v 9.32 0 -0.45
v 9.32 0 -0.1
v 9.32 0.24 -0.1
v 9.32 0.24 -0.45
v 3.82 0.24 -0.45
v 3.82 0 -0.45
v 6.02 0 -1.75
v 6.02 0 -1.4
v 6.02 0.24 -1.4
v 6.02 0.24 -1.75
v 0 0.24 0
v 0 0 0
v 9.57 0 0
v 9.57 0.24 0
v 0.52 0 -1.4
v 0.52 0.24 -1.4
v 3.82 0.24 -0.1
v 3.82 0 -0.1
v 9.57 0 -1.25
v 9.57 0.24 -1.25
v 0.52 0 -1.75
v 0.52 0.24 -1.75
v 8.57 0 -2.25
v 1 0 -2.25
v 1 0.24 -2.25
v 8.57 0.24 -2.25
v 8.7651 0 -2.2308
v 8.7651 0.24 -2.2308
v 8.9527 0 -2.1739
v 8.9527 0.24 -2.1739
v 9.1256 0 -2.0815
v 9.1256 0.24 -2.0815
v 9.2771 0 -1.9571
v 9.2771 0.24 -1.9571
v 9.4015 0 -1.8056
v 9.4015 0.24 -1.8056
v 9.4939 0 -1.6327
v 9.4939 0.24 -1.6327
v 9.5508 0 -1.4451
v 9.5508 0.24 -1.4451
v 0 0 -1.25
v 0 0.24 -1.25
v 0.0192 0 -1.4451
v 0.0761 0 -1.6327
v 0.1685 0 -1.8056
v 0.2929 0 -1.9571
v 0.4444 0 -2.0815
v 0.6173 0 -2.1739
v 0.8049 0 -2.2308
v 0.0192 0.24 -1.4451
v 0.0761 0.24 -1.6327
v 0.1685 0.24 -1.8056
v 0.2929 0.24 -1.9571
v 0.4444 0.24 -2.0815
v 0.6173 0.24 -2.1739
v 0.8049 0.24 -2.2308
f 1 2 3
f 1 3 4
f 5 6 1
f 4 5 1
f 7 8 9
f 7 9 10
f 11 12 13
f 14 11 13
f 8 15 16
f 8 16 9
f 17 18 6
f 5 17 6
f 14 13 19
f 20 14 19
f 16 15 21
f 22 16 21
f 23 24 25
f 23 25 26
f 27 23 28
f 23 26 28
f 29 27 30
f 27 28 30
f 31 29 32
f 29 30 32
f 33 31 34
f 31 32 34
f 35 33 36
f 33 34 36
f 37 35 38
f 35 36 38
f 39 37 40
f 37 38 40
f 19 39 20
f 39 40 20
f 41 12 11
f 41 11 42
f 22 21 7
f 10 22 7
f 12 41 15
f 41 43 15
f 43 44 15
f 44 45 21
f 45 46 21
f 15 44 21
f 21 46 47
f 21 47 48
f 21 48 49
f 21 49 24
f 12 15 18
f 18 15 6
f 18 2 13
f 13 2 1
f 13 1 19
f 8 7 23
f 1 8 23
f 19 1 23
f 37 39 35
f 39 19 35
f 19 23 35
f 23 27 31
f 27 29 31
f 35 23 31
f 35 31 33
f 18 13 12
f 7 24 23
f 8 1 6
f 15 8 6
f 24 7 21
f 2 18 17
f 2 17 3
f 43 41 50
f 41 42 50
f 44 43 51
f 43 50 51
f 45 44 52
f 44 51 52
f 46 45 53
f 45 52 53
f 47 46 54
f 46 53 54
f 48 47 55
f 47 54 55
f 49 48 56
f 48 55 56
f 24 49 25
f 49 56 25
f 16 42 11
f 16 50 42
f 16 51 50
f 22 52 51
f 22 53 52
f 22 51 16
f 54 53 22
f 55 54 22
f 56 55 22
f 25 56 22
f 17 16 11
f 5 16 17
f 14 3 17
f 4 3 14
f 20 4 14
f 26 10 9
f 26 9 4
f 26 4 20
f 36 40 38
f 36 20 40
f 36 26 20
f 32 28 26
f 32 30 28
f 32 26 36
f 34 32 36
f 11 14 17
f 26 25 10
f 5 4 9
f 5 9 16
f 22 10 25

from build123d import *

# Parameters (mm, degrees)
SKETCH1_W           = 9.57
SKETCH1_H           = 2.25
SKETCH1_W_2         = 5.5
SKETCH1_H_2         = 0.35
BOSS_EXTRUDE1_DEPTH = 0.24
FILLET1_R           = 1


with BuildPart() as part:
    # Sketch1 → Boss-Extrude1 (new body)
    with BuildSketch(Plane(origin=(0, 0, 0), x_dir=(1, 0, 0), z_dir=(0, 1, 0))):
        with Locations((4.785, 1.125)):
            Rectangle(SKETCH1_W, SKETCH1_H)
        with Locations((3.27, 1.575)):
            Rectangle(SKETCH1_W_2, SKETCH1_H_2, mode=Mode.SUBTRACT)
        with Locations((6.57, 0.275)):
            Rectangle(SKETCH1_W_2, SKETCH1_H_2, mode=Mode.SUBTRACT)
    extrude(amount=BOSS_EXTRUDE1_DEPTH)

    # Fillet1
    fillet1_edges = [part.edges().sort_by_distance(p)[0] for p in [
        (0, 0.12, -2.25),
        (9.57, 0.12, -2.25),
    ]]
    fillet(fillet1_edges, radius=FILLET1_R)


solid = part.part
